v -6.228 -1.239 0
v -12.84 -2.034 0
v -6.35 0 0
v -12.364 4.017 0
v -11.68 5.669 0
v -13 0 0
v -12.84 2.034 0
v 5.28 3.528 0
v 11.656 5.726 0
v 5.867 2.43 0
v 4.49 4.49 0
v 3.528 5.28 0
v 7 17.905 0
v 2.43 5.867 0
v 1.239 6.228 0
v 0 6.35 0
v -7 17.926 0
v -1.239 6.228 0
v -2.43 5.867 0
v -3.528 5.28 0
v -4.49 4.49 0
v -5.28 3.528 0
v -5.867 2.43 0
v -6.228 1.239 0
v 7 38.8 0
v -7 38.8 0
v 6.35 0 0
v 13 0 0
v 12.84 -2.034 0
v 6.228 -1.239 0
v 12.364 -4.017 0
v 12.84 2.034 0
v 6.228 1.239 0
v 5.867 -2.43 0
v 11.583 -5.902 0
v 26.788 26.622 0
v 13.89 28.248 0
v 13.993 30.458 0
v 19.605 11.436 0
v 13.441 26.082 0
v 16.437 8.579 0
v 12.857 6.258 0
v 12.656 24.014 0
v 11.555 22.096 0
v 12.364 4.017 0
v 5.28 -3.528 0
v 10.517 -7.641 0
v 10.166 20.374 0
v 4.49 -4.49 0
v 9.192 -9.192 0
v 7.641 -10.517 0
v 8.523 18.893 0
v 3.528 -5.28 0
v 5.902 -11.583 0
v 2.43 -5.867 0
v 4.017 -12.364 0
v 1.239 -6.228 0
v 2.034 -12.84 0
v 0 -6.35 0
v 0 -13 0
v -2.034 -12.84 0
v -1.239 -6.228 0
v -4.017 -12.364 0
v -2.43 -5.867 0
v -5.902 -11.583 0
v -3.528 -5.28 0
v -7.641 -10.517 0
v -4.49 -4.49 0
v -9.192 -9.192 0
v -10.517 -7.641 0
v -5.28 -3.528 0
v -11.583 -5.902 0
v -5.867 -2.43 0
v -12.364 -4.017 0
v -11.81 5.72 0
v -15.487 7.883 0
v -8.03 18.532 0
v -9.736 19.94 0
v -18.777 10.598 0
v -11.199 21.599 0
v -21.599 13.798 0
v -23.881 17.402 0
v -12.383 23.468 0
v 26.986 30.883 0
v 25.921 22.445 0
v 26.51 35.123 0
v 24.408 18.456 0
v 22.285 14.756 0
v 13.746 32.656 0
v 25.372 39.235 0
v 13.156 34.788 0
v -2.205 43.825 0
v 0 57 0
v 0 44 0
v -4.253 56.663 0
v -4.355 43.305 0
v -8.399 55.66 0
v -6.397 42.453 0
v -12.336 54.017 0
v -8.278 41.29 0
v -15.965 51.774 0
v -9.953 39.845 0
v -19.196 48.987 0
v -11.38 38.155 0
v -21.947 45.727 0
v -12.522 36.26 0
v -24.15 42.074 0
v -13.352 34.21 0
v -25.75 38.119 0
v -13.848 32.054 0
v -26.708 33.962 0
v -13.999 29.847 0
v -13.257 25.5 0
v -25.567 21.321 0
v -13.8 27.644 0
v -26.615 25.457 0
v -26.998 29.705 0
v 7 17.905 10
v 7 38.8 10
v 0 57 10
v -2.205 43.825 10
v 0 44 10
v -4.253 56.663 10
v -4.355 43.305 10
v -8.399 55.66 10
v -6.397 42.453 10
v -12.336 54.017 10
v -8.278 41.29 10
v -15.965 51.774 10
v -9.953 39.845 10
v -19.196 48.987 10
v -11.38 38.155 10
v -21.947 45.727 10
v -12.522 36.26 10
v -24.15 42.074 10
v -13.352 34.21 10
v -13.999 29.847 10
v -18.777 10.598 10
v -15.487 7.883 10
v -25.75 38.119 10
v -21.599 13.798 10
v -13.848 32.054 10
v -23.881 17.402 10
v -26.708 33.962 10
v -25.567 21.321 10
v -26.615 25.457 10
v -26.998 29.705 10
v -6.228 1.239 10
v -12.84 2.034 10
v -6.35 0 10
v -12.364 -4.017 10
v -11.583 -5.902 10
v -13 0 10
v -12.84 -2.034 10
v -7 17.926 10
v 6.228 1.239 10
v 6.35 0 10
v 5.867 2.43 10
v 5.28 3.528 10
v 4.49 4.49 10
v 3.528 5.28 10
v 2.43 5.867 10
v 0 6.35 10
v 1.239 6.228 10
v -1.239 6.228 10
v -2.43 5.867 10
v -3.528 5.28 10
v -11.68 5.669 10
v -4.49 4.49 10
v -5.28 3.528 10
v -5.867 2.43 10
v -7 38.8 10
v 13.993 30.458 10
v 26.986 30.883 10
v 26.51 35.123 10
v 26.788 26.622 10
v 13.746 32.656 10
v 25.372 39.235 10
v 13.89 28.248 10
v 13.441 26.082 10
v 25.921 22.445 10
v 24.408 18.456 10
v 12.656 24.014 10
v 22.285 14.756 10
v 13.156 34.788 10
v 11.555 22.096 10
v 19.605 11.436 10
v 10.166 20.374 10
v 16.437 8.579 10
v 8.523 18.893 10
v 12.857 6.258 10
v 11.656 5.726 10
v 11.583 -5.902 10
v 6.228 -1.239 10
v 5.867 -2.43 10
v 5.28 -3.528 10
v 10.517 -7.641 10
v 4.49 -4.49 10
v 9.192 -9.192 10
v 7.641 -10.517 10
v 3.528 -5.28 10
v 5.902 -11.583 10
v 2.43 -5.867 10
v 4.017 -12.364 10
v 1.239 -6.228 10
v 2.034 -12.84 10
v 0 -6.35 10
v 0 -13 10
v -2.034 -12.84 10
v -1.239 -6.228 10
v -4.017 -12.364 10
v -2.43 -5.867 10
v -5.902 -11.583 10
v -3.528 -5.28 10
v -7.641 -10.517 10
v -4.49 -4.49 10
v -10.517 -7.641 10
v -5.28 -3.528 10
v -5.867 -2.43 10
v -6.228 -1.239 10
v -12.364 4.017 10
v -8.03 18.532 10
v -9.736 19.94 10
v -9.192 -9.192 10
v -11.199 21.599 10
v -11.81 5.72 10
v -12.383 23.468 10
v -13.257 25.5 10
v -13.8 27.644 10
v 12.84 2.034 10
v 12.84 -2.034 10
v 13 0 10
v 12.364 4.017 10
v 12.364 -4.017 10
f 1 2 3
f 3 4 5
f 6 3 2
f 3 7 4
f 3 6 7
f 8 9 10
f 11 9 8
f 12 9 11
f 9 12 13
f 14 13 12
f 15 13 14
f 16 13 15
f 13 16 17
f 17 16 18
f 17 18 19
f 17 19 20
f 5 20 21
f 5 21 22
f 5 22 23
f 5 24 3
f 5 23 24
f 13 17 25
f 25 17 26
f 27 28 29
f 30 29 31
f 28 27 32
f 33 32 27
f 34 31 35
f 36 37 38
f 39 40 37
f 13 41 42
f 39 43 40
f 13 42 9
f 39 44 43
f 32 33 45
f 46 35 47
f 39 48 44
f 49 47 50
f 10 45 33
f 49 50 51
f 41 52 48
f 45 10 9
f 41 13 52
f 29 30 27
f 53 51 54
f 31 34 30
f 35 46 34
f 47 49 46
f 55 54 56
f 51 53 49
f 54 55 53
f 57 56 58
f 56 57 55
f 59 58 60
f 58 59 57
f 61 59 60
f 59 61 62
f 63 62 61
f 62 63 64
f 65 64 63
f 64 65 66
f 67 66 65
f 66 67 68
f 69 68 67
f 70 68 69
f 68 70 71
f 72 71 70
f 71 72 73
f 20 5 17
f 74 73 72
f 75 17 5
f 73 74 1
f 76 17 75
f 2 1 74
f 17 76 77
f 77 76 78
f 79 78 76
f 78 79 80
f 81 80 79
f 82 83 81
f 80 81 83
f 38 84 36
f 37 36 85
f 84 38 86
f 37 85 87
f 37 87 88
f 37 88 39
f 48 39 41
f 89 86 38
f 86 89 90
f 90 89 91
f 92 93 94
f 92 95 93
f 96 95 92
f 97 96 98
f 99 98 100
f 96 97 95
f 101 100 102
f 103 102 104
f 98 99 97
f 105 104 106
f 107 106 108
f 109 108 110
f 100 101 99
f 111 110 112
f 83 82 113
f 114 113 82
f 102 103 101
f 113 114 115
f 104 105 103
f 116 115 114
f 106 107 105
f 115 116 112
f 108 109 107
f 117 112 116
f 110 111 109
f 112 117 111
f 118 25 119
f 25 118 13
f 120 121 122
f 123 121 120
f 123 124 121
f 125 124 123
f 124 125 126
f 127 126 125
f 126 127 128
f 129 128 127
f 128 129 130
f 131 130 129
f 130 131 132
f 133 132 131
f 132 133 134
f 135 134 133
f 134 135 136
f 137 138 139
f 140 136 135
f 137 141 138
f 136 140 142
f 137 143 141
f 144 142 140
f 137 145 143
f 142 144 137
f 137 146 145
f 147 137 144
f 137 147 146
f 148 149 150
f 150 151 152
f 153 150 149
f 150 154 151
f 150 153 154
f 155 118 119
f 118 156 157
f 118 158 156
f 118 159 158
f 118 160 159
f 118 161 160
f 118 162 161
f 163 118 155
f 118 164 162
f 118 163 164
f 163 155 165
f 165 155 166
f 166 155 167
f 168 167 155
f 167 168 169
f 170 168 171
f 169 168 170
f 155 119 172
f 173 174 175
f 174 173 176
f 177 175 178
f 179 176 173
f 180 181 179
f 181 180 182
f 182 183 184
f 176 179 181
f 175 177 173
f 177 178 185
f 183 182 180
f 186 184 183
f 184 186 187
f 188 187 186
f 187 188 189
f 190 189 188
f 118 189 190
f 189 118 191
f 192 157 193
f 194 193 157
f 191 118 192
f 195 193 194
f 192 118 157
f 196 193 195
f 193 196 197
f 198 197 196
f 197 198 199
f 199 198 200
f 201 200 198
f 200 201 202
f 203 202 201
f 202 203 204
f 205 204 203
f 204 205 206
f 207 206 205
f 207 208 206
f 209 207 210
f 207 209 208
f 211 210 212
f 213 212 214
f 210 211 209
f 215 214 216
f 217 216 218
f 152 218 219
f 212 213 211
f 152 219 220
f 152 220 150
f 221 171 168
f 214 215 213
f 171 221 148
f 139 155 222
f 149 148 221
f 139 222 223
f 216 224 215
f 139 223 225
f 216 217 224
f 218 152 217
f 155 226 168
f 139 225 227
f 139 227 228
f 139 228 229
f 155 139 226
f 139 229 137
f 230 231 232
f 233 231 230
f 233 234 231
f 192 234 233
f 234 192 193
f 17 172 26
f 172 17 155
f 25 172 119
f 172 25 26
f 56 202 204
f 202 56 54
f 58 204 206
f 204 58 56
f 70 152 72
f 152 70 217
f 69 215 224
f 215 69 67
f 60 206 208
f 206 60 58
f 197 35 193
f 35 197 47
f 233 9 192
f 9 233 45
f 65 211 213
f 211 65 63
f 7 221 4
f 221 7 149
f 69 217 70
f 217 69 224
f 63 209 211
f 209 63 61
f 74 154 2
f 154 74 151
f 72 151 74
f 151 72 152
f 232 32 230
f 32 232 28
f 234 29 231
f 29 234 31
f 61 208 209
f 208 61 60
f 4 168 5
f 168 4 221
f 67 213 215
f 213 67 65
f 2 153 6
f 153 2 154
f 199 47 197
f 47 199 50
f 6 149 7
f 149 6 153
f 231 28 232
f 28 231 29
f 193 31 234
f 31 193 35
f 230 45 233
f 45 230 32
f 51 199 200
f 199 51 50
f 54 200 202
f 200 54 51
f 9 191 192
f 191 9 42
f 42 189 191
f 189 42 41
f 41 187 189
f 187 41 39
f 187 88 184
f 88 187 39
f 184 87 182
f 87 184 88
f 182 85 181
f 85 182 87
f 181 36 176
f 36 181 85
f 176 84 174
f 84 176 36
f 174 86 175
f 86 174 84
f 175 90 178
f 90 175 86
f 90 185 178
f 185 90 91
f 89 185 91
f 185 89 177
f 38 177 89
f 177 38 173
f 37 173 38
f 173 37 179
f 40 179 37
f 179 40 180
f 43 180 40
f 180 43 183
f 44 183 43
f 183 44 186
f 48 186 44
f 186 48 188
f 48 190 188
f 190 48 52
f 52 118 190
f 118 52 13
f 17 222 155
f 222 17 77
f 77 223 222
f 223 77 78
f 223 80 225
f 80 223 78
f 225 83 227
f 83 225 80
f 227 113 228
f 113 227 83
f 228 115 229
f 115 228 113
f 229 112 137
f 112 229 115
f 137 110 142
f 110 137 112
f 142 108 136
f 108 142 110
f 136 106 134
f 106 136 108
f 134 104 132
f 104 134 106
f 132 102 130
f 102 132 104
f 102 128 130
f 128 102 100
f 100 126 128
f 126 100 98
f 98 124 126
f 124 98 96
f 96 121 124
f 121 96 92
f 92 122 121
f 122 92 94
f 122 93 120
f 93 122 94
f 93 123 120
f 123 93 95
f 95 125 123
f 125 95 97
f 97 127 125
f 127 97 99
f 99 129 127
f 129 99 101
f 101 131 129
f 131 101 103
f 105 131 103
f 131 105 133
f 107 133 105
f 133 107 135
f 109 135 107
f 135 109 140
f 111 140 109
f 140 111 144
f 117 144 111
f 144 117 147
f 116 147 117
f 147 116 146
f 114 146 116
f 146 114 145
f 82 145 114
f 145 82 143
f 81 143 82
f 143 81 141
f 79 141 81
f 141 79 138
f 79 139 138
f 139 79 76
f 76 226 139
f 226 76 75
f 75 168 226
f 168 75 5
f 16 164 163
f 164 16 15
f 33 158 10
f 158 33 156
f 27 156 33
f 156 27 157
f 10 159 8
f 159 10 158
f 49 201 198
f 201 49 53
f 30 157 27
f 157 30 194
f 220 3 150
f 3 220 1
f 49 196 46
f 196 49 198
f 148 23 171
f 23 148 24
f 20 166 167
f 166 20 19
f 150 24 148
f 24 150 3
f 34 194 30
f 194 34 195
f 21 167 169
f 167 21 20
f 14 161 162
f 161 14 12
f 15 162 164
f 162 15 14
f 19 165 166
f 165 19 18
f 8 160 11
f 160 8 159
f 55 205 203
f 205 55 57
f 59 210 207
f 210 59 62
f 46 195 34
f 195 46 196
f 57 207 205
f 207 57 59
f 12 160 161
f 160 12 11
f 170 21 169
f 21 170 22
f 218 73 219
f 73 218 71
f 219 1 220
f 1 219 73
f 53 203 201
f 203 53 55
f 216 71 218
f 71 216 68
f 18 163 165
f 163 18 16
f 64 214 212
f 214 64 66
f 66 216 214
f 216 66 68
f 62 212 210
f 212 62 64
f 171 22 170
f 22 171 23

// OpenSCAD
$fn = 32;

// ----------------------------------------------------------------------
// Hook: 60 mm shank into a 14 mm curl, 10 mm thick
// ----------------------------------------------------------------------

// --- parameters (mm) ---
shank_len = 60;           // shank length from the boss centre
shank_w = 14;             // shank width
boss_d = 26;              // boss diameter
bore_d = 12.7;            // boss bore
curl_in = 14;             // curl inner radius
curl_out = 27;            // curl outer radius
curl_sweep = 290;         // curl sweep angle
hook_t = 10;              // hook thickness

shank_profile = [[-7, 38.8], [7, 38.8], [7, 11], [-7, 11]];
boss_profile = [[13, 0], [12.84, 2.034], [12.364, 4.017], [11.583, 5.902], [10.517, 7.641], [9.192, 9.192], [7.641, 10.517], [5.902, 11.583], [4.017, 12.364], [2.034, 12.84], [0, 13], [-2.034, 12.84], [-4.017, 12.364], [-5.902, 11.583], [-7.641, 10.517], [-9.192, 9.192], [-10.517, 7.641], [-11.583, 5.902], [-12.364, 4.017], [-12.84, 2.034], [-13, 0], [-12.84, -2.034], [-12.364, -4.017], [-11.583, -5.902], [-10.517, -7.641], [-9.192, -9.192], [-7.641, -10.517], [-5.902, -11.583], [-4.017, -12.364], [-2.034, -12.84], [0, -13], [2.034, -12.84], [4.017, -12.364], [5.902, -11.583], [7.641, -10.517], [9.192, -9.192], [10.517, -7.641], [11.583, -5.902], [12.364, -4.017], [12.84, -2.034]];
curl_profile = [[0, 57], [-4.253, 56.663], [-8.399, 55.66], [-12.336, 54.017], [-15.965, 51.774], [-19.196, 48.987], [-21.947, 45.727], [-24.15, 42.074], [-25.75, 38.119], [-26.708, 33.962], [-26.998, 29.705], [-26.615, 25.457], [-25.567, 21.321], [-23.881, 17.402], [-21.599, 13.798], [-18.777, 10.598], [-15.487, 7.883], [-11.81, 5.72], [-7.838, 4.163], [-3.67, 3.251], [0.589, 3.006], [4.833, 3.436], [8.957, 4.529], [12.857, 6.258], [16.437, 8.579], [19.605, 11.436], [22.285, 14.756], [24.408, 18.456], [25.921, 22.445], [26.788, 26.622], [26.986, 30.883], [26.51, 35.123], [25.372, 39.235], [13.156, 34.788], [13.746, 32.656], [13.993, 30.458], [13.89, 28.248], [13.441, 26.082], [12.656, 24.014], [11.555, 22.096], [10.166, 20.374], [8.523, 18.893], [6.667, 17.689], [4.644, 16.793], [2.506, 16.226], [0.305, 16.003], [-1.903, 16.13], [-4.064, 16.603], [-6.123, 17.41], [-8.03, 18.532], [-9.736, 19.94], [-11.199, 21.599], [-12.383, 23.468], [-13.257, 25.5], [-13.8, 27.644], [-13.999, 29.847], [-13.848, 32.054], [-13.352, 34.21], [-12.522, 36.26], [-11.38, 38.155], [-9.953, 39.845], [-8.278, 41.29], [-6.397, 42.453], [-4.355, 43.305], [-2.205, 43.825], [0, 44]];

difference() {
  union() {
    /* three overlapping outlines: shank, boss and the smooth curl */
    linear_extrude(height = hook_t) polygon(shank_profile);
    linear_extrude(height = hook_t) polygon(boss_profile);
    linear_extrude(height = hook_t) polygon(curl_profile);
  }
  translate([0, 0, -2.5]) cylinder(h = hook_t + 5, d = bore_d);
}
